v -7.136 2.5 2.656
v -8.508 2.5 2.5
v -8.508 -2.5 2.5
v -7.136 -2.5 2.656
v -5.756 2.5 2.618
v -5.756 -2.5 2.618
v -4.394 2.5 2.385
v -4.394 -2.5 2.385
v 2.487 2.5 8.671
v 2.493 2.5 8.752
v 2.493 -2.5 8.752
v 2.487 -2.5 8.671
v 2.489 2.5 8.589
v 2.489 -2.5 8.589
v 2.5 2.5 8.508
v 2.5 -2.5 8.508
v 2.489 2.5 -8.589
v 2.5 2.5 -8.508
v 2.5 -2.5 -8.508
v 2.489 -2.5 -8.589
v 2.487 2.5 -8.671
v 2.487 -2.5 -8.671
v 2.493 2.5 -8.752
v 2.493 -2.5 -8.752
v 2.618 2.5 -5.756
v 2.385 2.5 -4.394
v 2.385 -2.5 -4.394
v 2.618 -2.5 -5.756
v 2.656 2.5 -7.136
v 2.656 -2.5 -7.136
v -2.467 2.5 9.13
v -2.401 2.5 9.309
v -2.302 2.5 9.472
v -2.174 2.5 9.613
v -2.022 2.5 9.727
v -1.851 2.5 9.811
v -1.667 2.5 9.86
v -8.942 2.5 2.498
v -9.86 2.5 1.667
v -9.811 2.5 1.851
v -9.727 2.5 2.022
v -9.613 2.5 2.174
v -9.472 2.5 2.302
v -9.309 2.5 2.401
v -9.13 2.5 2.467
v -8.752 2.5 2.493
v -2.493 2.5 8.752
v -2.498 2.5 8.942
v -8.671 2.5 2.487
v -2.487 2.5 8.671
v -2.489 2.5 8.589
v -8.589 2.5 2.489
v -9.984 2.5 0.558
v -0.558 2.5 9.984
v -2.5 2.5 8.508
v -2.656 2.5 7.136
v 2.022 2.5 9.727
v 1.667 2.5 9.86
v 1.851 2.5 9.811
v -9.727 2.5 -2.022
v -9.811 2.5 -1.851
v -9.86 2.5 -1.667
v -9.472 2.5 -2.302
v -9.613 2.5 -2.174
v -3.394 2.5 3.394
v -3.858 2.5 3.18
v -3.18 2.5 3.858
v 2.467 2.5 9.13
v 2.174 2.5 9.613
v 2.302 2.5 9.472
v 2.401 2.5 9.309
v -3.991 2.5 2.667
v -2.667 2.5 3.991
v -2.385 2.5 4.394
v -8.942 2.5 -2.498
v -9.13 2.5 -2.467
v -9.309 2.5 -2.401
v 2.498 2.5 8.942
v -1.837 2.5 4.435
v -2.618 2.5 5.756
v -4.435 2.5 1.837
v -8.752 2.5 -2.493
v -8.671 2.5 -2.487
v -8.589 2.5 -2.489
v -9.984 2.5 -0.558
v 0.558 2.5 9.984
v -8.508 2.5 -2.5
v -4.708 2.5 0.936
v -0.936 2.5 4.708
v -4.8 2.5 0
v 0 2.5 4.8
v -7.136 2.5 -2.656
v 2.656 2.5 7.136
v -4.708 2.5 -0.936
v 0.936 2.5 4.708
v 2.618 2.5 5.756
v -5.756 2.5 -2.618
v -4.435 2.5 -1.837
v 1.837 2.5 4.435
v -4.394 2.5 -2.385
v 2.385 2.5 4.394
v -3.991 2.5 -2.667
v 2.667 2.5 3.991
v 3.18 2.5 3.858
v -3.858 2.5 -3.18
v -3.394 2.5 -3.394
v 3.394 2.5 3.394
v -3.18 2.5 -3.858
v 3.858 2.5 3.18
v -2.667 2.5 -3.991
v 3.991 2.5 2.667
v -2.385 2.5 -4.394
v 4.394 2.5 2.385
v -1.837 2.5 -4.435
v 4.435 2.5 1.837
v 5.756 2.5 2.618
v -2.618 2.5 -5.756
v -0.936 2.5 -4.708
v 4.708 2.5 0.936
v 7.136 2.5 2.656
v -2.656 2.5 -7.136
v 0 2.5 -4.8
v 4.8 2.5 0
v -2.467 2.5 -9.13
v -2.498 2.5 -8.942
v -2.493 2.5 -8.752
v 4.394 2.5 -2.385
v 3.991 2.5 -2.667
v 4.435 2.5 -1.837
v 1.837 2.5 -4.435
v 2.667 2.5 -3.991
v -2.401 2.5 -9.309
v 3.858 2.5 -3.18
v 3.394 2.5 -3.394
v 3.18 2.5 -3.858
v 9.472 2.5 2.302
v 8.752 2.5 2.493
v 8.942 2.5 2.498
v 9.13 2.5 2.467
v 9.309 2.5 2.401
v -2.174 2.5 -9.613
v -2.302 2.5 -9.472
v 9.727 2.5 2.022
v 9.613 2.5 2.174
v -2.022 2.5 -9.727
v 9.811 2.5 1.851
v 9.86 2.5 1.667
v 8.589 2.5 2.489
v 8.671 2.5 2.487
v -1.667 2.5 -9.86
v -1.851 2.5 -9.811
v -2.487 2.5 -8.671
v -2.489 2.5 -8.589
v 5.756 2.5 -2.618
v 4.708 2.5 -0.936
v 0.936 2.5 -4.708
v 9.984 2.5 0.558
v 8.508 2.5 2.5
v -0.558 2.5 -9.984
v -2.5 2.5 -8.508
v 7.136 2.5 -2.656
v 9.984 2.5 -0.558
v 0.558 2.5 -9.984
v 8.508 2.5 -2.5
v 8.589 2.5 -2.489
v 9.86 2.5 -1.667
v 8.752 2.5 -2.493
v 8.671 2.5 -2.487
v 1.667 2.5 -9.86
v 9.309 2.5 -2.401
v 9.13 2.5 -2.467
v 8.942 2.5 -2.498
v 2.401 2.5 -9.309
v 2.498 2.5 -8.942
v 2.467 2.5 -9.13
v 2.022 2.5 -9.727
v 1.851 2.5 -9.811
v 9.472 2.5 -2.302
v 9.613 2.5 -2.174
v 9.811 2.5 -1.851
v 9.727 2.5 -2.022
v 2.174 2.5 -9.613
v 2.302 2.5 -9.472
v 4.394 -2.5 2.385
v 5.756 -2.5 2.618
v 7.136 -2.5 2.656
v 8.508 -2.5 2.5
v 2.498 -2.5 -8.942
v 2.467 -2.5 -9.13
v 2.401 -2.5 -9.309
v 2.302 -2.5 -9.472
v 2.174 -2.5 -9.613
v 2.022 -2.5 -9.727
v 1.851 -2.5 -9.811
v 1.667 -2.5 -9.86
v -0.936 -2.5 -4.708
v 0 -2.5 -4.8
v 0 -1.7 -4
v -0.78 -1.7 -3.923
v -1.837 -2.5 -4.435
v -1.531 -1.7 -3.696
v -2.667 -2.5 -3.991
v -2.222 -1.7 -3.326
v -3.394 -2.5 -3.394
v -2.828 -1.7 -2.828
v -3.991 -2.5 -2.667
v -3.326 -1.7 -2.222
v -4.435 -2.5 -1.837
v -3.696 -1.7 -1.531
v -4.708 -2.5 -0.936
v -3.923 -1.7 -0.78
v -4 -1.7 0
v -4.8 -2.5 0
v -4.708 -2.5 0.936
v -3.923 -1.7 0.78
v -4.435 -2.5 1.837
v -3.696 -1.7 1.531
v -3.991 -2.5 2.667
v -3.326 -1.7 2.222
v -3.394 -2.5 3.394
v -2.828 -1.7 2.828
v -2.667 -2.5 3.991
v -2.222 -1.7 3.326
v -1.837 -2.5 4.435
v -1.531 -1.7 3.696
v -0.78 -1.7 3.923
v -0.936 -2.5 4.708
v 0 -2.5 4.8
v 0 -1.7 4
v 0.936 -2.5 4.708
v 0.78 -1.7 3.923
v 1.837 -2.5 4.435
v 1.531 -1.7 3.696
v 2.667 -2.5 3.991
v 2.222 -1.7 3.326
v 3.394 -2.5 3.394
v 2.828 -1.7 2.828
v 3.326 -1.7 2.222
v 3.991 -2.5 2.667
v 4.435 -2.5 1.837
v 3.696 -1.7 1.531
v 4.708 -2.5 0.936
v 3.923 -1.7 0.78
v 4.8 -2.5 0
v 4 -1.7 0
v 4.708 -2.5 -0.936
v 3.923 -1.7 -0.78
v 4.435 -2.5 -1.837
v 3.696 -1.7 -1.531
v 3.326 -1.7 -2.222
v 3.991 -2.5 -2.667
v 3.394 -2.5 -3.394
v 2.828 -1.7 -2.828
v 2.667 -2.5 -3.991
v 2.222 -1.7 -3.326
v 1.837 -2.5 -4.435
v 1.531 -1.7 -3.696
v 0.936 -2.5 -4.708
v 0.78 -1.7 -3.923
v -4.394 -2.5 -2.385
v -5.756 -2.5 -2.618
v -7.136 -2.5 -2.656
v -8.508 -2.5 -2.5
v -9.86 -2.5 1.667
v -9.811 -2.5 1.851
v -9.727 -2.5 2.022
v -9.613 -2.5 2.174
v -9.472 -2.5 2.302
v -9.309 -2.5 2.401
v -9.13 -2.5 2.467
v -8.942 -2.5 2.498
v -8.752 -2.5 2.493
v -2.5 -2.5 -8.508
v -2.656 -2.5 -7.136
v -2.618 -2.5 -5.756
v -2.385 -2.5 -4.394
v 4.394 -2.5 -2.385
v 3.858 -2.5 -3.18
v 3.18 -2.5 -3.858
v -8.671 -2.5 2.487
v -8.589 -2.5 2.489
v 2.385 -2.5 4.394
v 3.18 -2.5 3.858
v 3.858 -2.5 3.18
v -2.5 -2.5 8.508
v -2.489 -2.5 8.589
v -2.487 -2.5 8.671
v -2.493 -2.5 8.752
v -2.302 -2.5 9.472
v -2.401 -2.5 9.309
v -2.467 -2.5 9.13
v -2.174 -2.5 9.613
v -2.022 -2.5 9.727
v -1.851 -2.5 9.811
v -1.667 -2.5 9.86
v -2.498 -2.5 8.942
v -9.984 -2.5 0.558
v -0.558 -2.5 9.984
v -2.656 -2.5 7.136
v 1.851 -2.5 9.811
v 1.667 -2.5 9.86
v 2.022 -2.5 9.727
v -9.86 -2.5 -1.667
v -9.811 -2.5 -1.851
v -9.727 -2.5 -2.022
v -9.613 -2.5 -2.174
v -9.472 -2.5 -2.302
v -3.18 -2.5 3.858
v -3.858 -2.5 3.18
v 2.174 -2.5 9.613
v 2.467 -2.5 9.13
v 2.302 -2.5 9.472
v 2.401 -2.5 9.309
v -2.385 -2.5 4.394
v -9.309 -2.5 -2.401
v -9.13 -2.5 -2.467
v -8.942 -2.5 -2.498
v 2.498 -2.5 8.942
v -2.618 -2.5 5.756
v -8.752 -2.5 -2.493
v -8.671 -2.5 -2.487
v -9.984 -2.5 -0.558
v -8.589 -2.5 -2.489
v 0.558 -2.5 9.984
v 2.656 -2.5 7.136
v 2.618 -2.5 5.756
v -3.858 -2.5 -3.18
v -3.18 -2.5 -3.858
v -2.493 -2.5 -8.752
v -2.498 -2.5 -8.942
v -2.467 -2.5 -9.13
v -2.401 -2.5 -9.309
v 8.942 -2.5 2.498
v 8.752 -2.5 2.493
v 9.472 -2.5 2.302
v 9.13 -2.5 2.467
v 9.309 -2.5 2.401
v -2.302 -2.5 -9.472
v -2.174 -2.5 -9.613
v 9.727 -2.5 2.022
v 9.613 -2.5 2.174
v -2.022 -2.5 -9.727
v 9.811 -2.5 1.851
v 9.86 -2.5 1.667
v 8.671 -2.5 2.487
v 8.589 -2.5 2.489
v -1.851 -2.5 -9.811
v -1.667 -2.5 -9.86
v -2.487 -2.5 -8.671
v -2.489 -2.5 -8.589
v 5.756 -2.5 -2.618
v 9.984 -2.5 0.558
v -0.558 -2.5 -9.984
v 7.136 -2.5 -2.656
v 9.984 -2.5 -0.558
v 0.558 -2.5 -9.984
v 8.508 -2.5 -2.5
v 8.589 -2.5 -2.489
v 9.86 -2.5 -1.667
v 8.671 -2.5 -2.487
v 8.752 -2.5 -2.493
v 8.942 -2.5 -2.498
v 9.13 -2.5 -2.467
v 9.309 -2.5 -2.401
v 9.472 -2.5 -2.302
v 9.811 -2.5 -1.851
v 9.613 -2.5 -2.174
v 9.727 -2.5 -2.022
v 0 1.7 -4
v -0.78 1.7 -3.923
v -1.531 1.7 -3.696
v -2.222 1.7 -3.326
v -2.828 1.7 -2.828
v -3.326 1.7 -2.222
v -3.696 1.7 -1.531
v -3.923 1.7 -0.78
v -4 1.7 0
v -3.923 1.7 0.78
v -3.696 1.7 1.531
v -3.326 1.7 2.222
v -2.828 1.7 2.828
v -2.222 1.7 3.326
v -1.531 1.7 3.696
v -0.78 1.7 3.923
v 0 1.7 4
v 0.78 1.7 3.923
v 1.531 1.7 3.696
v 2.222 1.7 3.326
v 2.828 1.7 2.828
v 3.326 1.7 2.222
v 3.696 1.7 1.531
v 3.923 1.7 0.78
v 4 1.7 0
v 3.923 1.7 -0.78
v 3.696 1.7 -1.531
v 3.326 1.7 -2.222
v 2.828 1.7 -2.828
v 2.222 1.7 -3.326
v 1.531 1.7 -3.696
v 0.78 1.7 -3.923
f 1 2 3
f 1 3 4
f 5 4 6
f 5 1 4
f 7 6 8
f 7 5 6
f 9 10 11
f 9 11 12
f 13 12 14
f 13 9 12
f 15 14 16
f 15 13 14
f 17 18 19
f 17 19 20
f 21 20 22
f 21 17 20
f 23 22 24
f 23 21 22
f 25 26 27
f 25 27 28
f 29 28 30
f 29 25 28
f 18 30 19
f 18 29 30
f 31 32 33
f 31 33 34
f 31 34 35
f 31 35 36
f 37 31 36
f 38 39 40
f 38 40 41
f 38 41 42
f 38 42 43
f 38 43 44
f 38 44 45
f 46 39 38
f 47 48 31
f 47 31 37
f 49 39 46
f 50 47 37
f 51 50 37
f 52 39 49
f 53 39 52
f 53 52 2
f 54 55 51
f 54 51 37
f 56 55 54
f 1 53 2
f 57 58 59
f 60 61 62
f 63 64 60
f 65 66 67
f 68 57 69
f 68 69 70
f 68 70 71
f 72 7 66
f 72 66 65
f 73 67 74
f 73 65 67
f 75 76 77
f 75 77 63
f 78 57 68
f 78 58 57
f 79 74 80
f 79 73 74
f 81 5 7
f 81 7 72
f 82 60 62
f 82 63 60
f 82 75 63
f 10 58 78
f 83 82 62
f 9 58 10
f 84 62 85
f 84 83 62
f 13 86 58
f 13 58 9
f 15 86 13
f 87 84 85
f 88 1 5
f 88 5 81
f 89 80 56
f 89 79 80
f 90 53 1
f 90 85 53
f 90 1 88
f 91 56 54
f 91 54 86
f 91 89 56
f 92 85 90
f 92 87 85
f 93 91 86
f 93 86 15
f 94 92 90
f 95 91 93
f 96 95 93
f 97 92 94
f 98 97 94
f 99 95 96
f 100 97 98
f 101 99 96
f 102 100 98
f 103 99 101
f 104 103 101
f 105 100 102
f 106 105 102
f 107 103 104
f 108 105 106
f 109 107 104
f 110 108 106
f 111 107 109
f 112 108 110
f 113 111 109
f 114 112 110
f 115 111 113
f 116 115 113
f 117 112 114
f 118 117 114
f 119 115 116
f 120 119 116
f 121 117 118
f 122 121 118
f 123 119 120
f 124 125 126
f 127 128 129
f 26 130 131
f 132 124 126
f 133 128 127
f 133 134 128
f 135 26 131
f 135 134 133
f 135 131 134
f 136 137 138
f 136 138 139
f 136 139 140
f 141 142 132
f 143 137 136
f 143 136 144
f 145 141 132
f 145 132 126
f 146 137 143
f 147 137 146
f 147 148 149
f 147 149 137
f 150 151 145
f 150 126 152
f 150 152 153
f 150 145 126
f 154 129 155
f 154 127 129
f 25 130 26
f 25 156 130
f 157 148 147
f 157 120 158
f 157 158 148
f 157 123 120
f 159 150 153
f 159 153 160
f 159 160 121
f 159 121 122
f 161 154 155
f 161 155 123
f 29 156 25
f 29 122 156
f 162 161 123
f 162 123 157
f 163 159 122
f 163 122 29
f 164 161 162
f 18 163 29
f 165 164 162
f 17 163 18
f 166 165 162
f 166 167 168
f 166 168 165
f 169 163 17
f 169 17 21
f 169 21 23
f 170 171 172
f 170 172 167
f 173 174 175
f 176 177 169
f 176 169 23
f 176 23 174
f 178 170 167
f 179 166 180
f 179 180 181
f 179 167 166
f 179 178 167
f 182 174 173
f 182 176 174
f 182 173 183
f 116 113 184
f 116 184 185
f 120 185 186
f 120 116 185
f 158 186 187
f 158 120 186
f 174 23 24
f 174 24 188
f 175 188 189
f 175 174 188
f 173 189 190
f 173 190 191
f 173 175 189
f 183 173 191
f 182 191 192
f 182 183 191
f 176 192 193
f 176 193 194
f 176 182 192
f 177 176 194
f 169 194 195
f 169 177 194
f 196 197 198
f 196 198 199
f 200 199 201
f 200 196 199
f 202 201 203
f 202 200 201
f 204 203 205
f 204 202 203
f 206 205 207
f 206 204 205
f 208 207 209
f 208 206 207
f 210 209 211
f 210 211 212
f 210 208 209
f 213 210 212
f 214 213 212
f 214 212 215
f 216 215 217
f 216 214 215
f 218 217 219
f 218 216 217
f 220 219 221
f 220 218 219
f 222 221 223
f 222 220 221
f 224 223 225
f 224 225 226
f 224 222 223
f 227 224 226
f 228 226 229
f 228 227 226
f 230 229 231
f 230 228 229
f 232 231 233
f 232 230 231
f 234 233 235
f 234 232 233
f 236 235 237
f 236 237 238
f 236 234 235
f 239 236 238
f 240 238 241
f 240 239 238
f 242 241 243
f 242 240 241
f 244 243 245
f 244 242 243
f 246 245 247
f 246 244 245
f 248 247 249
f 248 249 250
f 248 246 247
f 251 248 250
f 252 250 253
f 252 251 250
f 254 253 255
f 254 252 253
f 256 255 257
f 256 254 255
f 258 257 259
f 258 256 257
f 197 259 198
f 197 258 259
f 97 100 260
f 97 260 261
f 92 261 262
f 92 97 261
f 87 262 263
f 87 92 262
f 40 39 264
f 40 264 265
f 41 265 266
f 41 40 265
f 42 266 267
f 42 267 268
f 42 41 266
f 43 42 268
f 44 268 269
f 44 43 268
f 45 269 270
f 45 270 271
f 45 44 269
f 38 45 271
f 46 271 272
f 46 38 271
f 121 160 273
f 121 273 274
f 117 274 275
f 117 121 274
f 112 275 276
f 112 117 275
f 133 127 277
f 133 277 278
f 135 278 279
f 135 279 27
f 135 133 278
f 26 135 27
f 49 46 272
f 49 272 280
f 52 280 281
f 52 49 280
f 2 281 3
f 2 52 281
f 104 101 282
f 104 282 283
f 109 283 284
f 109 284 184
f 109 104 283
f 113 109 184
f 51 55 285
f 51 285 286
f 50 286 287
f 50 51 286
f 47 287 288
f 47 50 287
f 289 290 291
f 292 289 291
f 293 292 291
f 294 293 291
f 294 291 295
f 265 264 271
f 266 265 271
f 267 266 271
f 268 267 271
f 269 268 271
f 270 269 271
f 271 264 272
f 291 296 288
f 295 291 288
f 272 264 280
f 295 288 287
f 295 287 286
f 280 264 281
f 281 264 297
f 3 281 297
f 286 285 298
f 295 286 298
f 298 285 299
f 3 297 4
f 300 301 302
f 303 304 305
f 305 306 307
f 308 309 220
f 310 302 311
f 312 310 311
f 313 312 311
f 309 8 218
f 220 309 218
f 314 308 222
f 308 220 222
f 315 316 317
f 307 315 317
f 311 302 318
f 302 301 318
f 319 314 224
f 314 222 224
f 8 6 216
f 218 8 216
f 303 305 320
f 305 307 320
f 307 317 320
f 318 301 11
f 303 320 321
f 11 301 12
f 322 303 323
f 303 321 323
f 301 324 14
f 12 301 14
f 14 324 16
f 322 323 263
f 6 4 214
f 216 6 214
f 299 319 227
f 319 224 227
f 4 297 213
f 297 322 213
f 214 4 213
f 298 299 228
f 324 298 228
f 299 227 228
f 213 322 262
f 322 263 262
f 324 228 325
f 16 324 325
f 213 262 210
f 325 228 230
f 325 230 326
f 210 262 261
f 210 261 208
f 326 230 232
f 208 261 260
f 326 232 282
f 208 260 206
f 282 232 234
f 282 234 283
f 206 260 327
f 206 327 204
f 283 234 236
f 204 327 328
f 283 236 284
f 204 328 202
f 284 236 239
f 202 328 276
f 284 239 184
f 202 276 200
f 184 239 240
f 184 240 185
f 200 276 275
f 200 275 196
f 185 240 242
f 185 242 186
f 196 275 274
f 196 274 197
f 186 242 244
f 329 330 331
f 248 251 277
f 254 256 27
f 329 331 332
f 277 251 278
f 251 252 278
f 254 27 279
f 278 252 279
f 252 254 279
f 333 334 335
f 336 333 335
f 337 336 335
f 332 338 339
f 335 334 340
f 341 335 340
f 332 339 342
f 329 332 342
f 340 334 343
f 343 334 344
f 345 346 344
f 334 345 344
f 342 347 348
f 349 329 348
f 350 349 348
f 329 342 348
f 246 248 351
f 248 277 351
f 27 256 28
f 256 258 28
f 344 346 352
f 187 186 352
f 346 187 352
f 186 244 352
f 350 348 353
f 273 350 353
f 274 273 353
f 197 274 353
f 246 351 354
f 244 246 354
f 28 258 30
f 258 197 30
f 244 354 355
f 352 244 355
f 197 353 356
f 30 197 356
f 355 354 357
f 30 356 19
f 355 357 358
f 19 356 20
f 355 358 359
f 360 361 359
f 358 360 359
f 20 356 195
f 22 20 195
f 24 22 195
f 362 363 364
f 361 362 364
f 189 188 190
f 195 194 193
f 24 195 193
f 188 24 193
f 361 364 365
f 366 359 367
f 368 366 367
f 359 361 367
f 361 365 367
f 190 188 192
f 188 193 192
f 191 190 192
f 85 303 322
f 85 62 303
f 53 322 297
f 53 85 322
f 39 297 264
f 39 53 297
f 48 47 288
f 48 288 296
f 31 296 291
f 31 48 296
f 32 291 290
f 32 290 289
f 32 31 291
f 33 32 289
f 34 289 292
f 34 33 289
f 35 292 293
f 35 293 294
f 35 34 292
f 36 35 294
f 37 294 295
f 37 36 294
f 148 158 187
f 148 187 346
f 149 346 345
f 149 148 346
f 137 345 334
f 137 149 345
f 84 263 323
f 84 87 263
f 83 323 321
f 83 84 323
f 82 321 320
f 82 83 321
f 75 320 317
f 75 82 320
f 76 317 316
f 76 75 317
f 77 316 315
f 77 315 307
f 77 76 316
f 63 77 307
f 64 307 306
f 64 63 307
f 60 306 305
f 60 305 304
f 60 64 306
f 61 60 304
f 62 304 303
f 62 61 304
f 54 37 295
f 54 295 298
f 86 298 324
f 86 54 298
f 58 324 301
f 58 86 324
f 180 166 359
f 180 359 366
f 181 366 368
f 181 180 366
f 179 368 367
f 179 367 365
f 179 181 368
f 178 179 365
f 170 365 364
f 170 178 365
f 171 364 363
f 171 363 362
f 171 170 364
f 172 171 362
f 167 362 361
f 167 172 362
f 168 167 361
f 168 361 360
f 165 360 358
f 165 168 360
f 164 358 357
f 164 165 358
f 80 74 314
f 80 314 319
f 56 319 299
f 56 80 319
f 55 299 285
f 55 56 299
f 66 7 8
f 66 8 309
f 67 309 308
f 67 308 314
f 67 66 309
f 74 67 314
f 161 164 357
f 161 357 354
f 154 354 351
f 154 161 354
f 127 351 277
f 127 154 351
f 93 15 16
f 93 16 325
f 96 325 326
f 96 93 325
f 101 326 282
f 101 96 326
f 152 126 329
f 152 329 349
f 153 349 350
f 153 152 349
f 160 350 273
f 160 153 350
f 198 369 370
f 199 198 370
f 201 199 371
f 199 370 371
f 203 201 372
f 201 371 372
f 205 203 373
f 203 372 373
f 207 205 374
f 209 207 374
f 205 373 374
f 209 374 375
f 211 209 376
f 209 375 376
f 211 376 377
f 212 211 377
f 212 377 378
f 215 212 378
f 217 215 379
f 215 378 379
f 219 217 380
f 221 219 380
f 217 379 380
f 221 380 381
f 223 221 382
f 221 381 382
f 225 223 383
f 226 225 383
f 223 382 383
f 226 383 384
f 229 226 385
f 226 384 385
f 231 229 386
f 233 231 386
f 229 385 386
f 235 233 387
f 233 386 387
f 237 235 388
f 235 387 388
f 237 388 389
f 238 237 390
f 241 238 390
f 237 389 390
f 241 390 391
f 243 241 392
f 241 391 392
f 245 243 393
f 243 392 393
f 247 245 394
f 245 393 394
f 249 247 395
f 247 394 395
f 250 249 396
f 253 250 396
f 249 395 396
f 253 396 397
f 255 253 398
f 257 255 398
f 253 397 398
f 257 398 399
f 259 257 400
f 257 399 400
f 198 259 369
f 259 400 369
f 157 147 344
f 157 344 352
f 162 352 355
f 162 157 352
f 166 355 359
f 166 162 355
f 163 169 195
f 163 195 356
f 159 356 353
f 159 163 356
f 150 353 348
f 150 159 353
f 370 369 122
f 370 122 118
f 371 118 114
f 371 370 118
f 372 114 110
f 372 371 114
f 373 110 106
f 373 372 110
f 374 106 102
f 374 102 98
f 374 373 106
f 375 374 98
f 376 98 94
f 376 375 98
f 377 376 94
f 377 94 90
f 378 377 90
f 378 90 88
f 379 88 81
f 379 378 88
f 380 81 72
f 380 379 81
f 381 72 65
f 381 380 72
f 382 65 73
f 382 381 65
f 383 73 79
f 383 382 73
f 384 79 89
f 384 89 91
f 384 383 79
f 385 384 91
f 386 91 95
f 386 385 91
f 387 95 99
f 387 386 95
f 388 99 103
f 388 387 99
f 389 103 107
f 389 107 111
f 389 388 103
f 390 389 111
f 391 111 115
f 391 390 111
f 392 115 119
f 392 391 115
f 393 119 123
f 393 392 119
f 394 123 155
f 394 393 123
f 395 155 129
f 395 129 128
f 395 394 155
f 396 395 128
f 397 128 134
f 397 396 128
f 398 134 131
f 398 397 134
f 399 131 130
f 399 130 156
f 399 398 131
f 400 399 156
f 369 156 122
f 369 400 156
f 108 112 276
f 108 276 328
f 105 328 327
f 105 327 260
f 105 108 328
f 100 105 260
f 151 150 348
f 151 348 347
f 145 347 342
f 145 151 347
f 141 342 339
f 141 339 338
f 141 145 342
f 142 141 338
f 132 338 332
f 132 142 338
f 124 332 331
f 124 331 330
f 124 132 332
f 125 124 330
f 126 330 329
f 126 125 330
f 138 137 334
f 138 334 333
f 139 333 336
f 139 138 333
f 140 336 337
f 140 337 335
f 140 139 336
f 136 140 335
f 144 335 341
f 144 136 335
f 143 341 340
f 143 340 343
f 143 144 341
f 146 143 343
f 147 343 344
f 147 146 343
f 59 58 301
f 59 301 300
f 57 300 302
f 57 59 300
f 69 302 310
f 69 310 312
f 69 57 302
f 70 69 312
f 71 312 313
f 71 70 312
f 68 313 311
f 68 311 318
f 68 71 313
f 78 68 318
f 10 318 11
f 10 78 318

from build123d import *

# Parameters (mm, degrees)
EXTRUDE_1_DEPTH     = 2.5
SKETCH_4_R          = 4
CUT_EXTRUDE_1_DEPTH = 6
CHAMFER_1_SIZE      = 0.8
CHAMFER_2_SIZE      = 0.8


with BuildPart() as part:
    # 草图1 → 凸台-拉伸1 (new, symmetric)
    with BuildSketch(Plane(origin=(0, 0, 0), x_dir=(1, 0, 0), z_dir=(0, 1, 0))):
        with BuildLine():
            ThreePointArc((-9.860132972, 1.666666667), (-10, 0), (-9.860132972, -1.666666667))
            ThreePointArc((-9.860132972, -1.666666667), (-9.471702803, -2.301806962), (-8.752043547, -2.49252074))
            ThreePointArc((-8.752043547, -2.49252074), (-8.629852726, -2.486913493), (-8.50823537, -2.5))
            ThreePointArc((-8.50823537, -2.5), (-6.445172036, -2.661121156), (-4.394270374, -2.385453391))
            ThreePointArc((-4.394270374, -2.385453391), (-3.535533906, -3.535533906), (-2.385453391, -4.394270374))
            ThreePointArc((-2.385453391, -4.394270374), (-2.661121156, -6.445172036), (-2.5, -8.50823537))
            ThreePointArc((-2.5, -8.50823537), (-2.486913493, -8.629852726), (-2.49252074, -8.752043547))
            ThreePointArc((-2.49252074, -8.752043547), (-2.301806962, -9.471702803), (-1.666666667, -9.860132972))
            ThreePointArc((-1.666666667, -9.860132972), (0, -10), (1.666666667, -9.860132972))
            ThreePointArc((1.666666667, -9.860132972), (2.301806962, -9.471702803), (2.49252074, -8.752043547))
            ThreePointArc((2.49252074, -8.752043547), (2.486913493, -8.629852726), (2.5, -8.50823537))
            ThreePointArc((2.5, -8.50823537), (2.661121156, -6.445172036), (2.385453391, -4.394270374))
            ThreePointArc((2.385453391, -4.394270374), (3.535533906, -3.535533906), (4.394270374, -2.385453391))
            ThreePointArc((4.394270374, -2.385453391), (6.445172036, -2.661121156), (8.50823537, -2.5))
            ThreePointArc((8.50823537, -2.5), (8.629852726, -2.486913493), (8.752043547, -2.49252074))
            ThreePointArc((8.752043547, -2.49252074), (9.471702803, -2.301806962), (9.860132972, -1.666666667))
            ThreePointArc((9.860132972, -1.666666667), (10, 0), (9.860132972, 1.666666667))
            ThreePointArc((9.860132972, 1.666666667), (9.471702803, 2.301806962), (8.752043547, 2.49252074))
            ThreePointArc((8.752043547, 2.49252074), (8.629852726, 2.486913493), (8.50823537, 2.5))
            ThreePointArc((8.50823537, 2.5), (6.445172036, 2.661121156), (4.394270374, 2.385453391))
            ThreePointArc((4.394270374, 2.385453391), (3.535533906, 3.535533906), (2.385453391, 4.394270374))
            ThreePointArc((2.385453391, 4.394270374), (2.661121156, 6.445172036), (2.5, 8.50823537))
            ThreePointArc((2.5, 8.50823537), (2.486913493, 8.629852726), (2.49252074, 8.752043547))
            ThreePointArc((2.49252074, 8.752043547), (2.301806962, 9.471702803), (1.666666667, 9.860132972))
            ThreePointArc((1.666666667, 9.860132972), (0, 10), (-1.666666667, 9.860132972))
            ThreePointArc((-1.666666667, 9.860132972), (-2.301806962, 9.471702803), (-2.49252074, 8.752043547))
            ThreePointArc((-2.49252074, 8.752043547), (-2.486913493, 8.629852726), (-2.5, 8.50823537))
            ThreePointArc((-2.5, 8.50823537), (-2.661121156, 6.445172036), (-2.385453391, 4.394270374))
            ThreePointArc((-2.385453391, 4.394270374), (-3.535533906, 3.535533906), (-4.394270374, 2.385453391))
            ThreePointArc((-4.394270374, 2.385453391), (-6.445172036, 2.661121156), (-8.50823537, 2.5))
            ThreePointArc((-8.50823537, 2.5), (-8.629852726, 2.486913493), (-8.752043547, 2.49252074))
            ThreePointArc((-8.752043547, 2.49252074), (-9.471702803, 2.301806962), (-9.860132972, 1.666666667))
        make_face()
    extrude(amount=EXTRUDE_1_DEPTH, both=True)

    # 草图4 → 切除-拉伸1 (cut, symmetric)
    with BuildSketch(Plane(origin=(0, 2.5, 0), x_dir=(1, 0, 0), z_dir=(0, 1, 0))):
        with Locations(Location((0, 0, 0), (0, 0, 90))):
            Circle(SKETCH_4_R)
    extrude(amount=CUT_EXTRUDE_1_DEPTH, both=True, mode=Mode.SUBTRACT)

    # 倒角1
    chamfer_1_edges = [part.edges().sort_by_distance(p)[0] for p in [
        (0, 2.5, 4),
    ]]
    chamfer(chamfer_1_edges, length=CHAMFER_1_SIZE)

    # 倒角2
    chamfer_2_edges = [part.edges().sort_by_distance(p)[0] for p in [
        (0, -2.5, 4),
    ]]
    chamfer(chamfer_2_edges, length=CHAMFER_2_SIZE)


solid = part.part
